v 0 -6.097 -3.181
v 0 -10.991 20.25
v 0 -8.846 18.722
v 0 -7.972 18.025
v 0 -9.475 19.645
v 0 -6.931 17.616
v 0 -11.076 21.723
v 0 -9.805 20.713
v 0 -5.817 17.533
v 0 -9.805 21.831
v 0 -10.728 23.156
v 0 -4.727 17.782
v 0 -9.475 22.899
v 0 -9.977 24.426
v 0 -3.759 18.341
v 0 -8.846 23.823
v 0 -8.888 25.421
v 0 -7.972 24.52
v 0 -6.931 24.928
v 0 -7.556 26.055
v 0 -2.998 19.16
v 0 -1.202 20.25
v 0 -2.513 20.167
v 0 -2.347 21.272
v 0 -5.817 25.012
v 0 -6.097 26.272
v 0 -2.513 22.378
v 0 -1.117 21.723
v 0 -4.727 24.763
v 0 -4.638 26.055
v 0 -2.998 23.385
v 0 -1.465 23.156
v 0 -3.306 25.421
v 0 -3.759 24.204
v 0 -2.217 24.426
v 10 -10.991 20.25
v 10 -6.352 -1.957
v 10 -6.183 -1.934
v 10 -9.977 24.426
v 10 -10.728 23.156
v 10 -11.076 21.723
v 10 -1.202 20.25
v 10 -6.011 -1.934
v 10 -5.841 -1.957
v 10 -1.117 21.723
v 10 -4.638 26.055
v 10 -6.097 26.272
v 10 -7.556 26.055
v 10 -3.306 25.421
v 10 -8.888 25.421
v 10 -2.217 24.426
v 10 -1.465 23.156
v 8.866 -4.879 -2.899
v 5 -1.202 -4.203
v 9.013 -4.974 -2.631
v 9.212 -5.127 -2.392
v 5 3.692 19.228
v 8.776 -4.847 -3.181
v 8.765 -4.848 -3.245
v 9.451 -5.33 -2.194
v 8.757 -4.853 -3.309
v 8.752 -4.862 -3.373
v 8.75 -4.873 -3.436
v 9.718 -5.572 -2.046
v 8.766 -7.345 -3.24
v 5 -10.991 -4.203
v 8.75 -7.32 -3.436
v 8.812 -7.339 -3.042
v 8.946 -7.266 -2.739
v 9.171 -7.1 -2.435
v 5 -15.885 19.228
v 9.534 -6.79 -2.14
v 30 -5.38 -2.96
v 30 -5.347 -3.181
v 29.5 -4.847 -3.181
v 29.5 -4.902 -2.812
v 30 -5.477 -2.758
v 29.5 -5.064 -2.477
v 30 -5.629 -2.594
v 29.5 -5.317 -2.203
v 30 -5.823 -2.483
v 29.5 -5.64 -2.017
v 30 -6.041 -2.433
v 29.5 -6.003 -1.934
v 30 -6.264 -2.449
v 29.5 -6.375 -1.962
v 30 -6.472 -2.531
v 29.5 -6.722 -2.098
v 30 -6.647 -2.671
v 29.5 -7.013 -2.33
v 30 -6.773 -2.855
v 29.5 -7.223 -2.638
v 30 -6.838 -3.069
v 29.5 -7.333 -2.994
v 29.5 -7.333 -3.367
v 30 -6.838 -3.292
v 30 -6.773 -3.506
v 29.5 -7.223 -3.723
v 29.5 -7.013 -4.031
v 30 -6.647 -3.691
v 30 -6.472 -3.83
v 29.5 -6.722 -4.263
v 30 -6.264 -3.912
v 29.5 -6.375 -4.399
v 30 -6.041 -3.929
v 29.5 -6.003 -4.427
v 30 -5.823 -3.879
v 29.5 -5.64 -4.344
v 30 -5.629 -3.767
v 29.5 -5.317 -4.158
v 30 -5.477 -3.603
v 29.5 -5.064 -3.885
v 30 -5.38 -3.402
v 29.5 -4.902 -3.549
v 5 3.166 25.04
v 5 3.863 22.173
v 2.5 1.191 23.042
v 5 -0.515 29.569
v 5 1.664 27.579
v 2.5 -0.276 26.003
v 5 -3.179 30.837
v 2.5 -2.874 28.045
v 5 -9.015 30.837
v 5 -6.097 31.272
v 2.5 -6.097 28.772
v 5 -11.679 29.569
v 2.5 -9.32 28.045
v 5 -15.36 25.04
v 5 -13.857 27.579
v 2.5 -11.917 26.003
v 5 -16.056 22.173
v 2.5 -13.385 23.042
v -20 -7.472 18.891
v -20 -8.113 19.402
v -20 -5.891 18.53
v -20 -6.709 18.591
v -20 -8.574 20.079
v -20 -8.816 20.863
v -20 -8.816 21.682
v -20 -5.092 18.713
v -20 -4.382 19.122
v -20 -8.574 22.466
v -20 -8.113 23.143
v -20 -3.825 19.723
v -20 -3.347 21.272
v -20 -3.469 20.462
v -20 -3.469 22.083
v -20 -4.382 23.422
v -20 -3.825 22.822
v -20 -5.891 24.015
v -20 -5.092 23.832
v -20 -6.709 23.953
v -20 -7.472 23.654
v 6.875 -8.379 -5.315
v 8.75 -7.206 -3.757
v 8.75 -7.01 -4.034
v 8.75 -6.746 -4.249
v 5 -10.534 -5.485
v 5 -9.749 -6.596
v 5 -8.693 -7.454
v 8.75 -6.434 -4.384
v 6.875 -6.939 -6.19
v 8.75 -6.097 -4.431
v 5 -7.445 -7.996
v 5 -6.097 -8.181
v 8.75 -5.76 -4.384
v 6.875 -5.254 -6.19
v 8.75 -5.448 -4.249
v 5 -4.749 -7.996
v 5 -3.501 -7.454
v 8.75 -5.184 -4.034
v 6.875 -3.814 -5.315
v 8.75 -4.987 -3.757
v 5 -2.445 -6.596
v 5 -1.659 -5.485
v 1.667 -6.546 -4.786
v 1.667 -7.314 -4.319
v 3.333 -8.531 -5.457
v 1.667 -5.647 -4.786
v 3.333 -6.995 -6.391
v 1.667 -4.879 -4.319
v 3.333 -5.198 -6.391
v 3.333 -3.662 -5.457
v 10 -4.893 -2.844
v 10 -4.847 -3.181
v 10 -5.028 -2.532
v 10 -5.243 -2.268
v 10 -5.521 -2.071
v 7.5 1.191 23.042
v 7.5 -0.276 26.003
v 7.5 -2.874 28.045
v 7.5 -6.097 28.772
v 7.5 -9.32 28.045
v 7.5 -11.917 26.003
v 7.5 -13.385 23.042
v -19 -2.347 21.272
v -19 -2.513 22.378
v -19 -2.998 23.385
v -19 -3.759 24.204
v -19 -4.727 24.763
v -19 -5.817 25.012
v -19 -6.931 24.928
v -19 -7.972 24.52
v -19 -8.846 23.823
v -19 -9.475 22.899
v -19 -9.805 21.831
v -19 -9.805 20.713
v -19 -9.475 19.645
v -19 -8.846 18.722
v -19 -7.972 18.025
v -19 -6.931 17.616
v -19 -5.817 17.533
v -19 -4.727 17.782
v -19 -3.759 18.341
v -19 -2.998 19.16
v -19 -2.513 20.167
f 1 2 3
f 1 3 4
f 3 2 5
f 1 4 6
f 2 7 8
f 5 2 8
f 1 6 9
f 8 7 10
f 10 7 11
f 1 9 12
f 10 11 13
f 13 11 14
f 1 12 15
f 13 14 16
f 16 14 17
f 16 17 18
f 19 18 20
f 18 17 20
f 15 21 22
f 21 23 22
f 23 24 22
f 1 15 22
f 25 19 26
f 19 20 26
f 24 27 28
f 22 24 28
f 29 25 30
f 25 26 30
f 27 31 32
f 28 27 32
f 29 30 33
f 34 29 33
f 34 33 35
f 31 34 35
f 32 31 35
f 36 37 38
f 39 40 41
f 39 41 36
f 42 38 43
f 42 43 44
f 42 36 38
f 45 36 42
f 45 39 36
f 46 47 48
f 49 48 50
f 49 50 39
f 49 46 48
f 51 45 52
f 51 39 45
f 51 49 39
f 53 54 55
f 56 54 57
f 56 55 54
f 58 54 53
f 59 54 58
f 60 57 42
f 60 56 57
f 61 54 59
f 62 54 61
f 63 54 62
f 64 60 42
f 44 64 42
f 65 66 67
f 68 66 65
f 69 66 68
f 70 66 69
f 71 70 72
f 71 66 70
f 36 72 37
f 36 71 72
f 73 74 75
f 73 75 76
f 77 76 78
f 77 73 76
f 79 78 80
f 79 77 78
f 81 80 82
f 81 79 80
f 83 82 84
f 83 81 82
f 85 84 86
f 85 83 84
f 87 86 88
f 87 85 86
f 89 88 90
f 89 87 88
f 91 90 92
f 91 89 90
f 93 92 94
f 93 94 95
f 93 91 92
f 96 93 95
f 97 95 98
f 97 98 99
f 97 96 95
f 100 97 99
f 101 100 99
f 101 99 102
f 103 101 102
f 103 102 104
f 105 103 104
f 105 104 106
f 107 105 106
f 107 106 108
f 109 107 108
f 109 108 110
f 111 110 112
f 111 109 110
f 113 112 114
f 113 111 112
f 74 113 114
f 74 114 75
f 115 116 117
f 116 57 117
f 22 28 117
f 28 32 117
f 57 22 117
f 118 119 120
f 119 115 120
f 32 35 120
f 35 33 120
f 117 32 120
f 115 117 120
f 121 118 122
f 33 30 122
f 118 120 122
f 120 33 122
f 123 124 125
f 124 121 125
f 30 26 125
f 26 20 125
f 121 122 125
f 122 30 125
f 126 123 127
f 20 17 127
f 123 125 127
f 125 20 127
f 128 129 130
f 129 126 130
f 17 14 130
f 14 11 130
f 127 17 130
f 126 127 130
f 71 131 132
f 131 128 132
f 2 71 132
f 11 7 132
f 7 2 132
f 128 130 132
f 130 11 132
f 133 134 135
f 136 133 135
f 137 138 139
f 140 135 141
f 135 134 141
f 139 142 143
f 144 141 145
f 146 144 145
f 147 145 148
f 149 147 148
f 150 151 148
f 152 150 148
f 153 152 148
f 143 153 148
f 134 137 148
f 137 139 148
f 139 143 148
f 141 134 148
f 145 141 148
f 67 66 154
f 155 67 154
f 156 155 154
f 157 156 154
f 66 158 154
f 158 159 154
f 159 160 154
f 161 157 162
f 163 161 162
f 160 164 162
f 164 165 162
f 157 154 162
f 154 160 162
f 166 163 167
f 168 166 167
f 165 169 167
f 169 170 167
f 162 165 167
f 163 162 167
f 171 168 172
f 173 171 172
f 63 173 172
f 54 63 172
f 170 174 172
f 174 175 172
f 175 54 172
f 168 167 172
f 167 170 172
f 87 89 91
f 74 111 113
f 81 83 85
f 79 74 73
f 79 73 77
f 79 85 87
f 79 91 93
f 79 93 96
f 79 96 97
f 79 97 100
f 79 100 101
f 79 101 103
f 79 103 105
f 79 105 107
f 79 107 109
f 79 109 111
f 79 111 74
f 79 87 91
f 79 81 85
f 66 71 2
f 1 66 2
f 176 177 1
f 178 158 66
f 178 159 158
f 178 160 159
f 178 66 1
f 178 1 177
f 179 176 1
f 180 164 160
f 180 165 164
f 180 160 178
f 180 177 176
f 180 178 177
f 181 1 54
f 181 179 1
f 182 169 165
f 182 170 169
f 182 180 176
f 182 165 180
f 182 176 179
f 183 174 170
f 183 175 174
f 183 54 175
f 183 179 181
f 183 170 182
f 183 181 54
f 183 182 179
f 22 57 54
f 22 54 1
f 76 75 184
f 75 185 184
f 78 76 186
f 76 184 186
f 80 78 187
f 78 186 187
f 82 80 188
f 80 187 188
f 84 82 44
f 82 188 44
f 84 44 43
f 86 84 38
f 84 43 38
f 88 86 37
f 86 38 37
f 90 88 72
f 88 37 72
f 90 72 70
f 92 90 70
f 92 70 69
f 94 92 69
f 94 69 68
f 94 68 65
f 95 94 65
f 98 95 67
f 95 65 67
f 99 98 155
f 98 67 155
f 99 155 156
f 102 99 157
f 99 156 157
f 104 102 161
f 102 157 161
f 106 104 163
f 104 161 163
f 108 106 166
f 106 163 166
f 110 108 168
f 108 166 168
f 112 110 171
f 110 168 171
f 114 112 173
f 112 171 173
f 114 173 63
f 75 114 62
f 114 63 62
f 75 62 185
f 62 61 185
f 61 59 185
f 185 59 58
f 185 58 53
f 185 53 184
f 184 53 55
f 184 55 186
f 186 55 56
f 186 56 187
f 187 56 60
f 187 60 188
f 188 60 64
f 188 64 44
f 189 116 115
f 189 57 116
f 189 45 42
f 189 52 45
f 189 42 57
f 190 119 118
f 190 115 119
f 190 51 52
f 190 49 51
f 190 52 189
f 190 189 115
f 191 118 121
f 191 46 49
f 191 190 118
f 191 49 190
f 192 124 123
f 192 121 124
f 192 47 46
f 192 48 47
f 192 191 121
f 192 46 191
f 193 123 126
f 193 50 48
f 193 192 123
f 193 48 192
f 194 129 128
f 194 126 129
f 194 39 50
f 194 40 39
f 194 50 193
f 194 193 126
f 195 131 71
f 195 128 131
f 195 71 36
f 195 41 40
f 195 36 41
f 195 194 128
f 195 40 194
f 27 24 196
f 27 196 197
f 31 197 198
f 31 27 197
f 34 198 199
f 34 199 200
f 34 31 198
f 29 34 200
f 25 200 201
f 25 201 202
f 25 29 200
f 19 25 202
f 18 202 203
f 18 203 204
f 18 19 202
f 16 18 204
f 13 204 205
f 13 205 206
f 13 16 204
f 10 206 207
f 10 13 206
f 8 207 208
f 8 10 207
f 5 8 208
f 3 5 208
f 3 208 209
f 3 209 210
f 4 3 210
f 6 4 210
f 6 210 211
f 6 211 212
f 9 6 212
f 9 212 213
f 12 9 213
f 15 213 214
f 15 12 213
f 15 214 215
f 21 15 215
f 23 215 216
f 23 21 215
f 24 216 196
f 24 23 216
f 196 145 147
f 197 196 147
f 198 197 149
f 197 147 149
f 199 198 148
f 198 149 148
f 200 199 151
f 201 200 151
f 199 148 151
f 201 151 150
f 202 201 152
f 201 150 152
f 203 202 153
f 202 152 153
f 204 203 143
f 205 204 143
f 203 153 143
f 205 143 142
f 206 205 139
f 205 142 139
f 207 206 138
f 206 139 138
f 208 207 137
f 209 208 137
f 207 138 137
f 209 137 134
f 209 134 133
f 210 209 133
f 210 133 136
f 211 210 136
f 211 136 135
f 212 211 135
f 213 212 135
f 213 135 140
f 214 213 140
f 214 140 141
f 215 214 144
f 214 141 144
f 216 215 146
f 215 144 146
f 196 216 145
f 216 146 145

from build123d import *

# Parameters (mm, degrees)
F0_R         = 3.75
F0_R_2       = 1.25
F1_DEPTH     = 10
F2_DEPTH     = 20
F3_DEPTH     = 30
F4_T1_DEPTH  = 23.936451485
F4_T3_DEPTH  = 23.936451485
F4_T8_DEPTH  = 23.936451485
F4_S9_R      = 1.25
F4_T10_DEPTH = 15
F4_T14_ANGLE = 156.4026846179
F4_S15_R     = 1.25
F4_T16_DEPTH = 8
F4_T18_ANGLE = 203.5973153821
F4_T22_DEPTH = 23.936451485
F4_S23_R     = 1.25
F4_T24_DEPTH = 15
F4_T26_ANGLE = 156.4026846179
F4_T28_ANGLE = 203.5973153821
F5_SIZE      = 1
F6_SIZE      = 0.5


# Not quite as in the source:
# - a fillet or chamfer that OpenCascade refuses, or shapes differently, is made with other operations: its cross-section is extruded or revolved along the edge and cut away or added


with BuildPart() as f1:
    # F0 (on Right) → F1 (new body)
    with BuildSketch(Plane.YZ):
        with BuildLine():
            ThreePointArc((3.6919470815, 19.2276737533), (3.8502654993, 20.2445960951), (3.9032252878, 21.2724049449))
            ThreePointArc((3.9032252878, 21.2724049449), (-7.124583562, 31.2194451563), (-15.8854965059, 19.2276737533))
            ThreePointArc((-15.8854965059, 19.2276737533), (-6.0967747122, 11.2724049449), (3.6919470815, 19.2276737533))
        make_face()
        with Locations((-6.0967747122, 21.2724049449)):
            Circle(F0_R, mode=Mode.SUBTRACT)
        with BuildLine():
            ThreePointArc((3.6919470815, 19.2276737533), (-6.0967747122, 11.2724049449), (-15.8854965059, 19.2276737533))
            Line((-15.8854965059, 19.2276737533), (-10.991135609, -4.2030526781))
            ThreePointArc((-10.991135609, -4.2030526781), (-6.6106791371, 1.7928330234), (-1.0967747122, -3.1806870823))
            ThreePointArc((-1.0967747122, -3.1806870823), (-1.1232546065, -3.6945915072), (-1.2024138154, -4.2030526781))
            Line((-1.2024138154, -4.2030526781), (3.6919470815, 19.2276737533))
        make_face()
        with BuildLine():
            ThreePointArc((-1.0967747122, -3.1806870823), (-6.6106791371, 1.7928330234), (-10.991135609, -4.2030526781))
            ThreePointArc((-10.991135609, -4.2030526781), (-6.0967747122, -8.1806870823), (-1.2024138154, -4.2030526781))
            ThreePointArc((-1.2024138154, -4.2030526781), (-1.1232546065, -3.6945915072), (-1.0967747122, -3.1806870823))
        make_face()
        with Locations((-6.0967747122, -3.1806870823)):
            Circle(F0_R_2, mode=Mode.SUBTRACT)
        with Locations((-6.0967747122, 21.2724049449)):
            Circle(F0_R)
        with Locations((-6.0967747122, -3.1806870823)):
            Circle(F0_R_2)
    extrude(amount=F1_DEPTH)

    # F0 (on Right) → F2 (join)
    with BuildSketch(Plane.YZ):
        with Locations((-6.0967747122, 21.2724049449)):
            Circle(F0_R)
    extrude(amount=-F2_DEPTH)

    # F0 (on Right) → F3 (join)
    with BuildSketch(Plane.YZ):
        with Locations((-6.0967747122, -3.1806870823)):
            Circle(F0_R_2)
    extrude(amount=F3_DEPTH)

    # F4: chamfer of 5 on 2 edges, made by hand

    # F4_s2 → F4_t1 (cut)
    with BuildSketch(Plane(origin=(0, -0.8915258311, -4.2679929606), x_dir=(1, 0, 0), z_dir=(0, 0.2044731192, 0.9788721794))):
        Polygon((5, -0.3175981408), (0, -5.3175981408), (0, -0.3175981408), align=None)
    extrude(amount=F4_T1_DEPTH, mode=Mode.SUBTRACT)

    # F4_s4 → F4_t3 (cut)
    with BuildSketch(Plane(origin=(0, -4.5126383008, 21.6033095513), x_dir=(1, 0, 0), z_dir=(0, 0.2044731192, -0.9788721794))):
        Polygon((5, 11.6183281585), (0, 6.6183281585), (0, 11.6183281585), align=None)
    extrude(amount=F4_T3_DEPTH, mode=Mode.SUBTRACT)


with BuildPart() as f4_tool6:
    # F4_s7 → F4_t8 (new body)
    with BuildSketch(Plane(origin=(0, -0.8915258311, -4.2679929606), x_dir=(1, 0, 0), z_dir=(0, 0.2044731192, 0.9788721794))):
        Polygon((5, -0.3175981408), (10, -5.3175981408), (10, -0.3175981408), align=None)
    extrude(amount=F4_T8_DEPTH)

    # F4_s9 → F4_t10 (cut, symmetric)
    with BuildSketch(Plane.YZ.offset(7.5)):
        with Locations((-6.0967747122, -3.1806870823)):
            Circle(F4_S9_R)
    extrude(amount=F4_T10_DEPTH, both=True, mode=Mode.SUBTRACT)


with BuildPart() as f1_1:
    add(f1.part)

    # F4_t5: cut F4_tool6
    add(f4_tool6.part, mode=Mode.SUBTRACT)


with BuildPart() as f4_tool12:
    # F4_s13 → F4_t14 (revolve)
    with BuildSketch(Plane(origin=(0, 0.381722596, -1.8274168801), x_dir=(1, 0, 0), z_dir=(0, -0.2044731192, 0.9788721794))):
        Polygon((10, -6.6183281585), (5, -11.6183281585), (10, -11.6183281585), align=None)
    revolve(axis=Axis((10, -6.0967747122, -3.1806870823), (1, 0, 0)), revolution_arc=F4_T14_ANGLE)

    # F4_s15 → F4_t16 (cut, symmetric)
    with BuildSketch(Plane.YZ.offset(7.5)):
        with Locations((-6.0967747122, -3.1806870823)):
            Circle(F4_S15_R)
    extrude(amount=F4_T16_DEPTH, both=True, mode=Mode.SUBTRACT)


with BuildPart() as f1_2:
    add(f1_1.part)

    # F4_t11: cut F4_tool12
    add(f4_tool12.part, mode=Mode.SUBTRACT)

    # F4_s17 → F4_t18 (revolve, cut)
    with BuildSketch(Plane(origin=(0, 4.0028350658, 19.1627334708), x_dir=(1, 0, 0), z_dir=(0, -0.2044731192, -0.9788721794))):
        Polygon((5, 0.3175981408), (10, 5.3175981408), (10, 0.3175981408), align=None)
    revolve(axis=Axis((10, -6.0967747122, 21.2724049449), (1, 0, 0)), revolution_arc=F4_T18_ANGLE, mode=Mode.SUBTRACT)


with BuildPart() as f4_tool20:
    # F4_s21 → F4_t22 (new body)
    with BuildSketch(Plane(origin=(0, -4.5126383008, 21.6033095513), x_dir=(1, 0, 0), z_dir=(0, 0.2044731192, -0.9788721794))):
        Polygon((5, 11.6183281585), (10, 6.6183281585), (10, 11.6183281585), align=None)
    extrude(amount=F4_T22_DEPTH)

    # F4_s23 → F4_t24 (cut, symmetric)
    with BuildSketch(Plane.YZ.offset(7.5)):
        with Locations((-6.0967747122, -3.1806870823)):
            Circle(F4_S23_R)
    extrude(amount=F4_T24_DEPTH, both=True, mode=Mode.SUBTRACT)


with BuildPart() as f1_3:
    add(f1_2.part)

    # F4_t19: cut F4_tool20
    add(f4_tool20.part, mode=Mode.SUBTRACT)

    # F4_s25 → F4_t26 (revolve, cut)
    with BuildSketch(Plane(origin=(0, 0.381722596, -1.8274168801), x_dir=(1, 0, 0), z_dir=(0, -0.2044731192, 0.9788721794))):
        Polygon((0, -6.6183281585), (5, -11.6183281585), (0, -11.6183281585), align=None)
    revolve(axis=Axis((0, -6.0967747122, -3.1806870823), (1, 0, 0)), revolution_arc=F4_T26_ANGLE, mode=Mode.SUBTRACT)

    # F4_s27 → F4_t28 (revolve, cut)
    with BuildSketch(Plane(origin=(0, 4.0028350658, 19.1627334708), x_dir=(1, 0, 0), z_dir=(0, -0.2044731192, -0.9788721794))):
        Polygon((5, 0.3175981408), (0, 5.3175981408), (0, 0.3175981408), align=None)
    revolve(axis=Axis((0, -6.0967747122, 21.2724049449), (1, 0, 0)), revolution_arc=F4_T28_ANGLE, mode=Mode.SUBTRACT)

    # F5
    f5_edges = [f1_3.edges().sort_by_distance(p)[0] for p in [
        (-20, -9.846775, 21.272405),
    ]]
    chamfer(f5_edges, length=F5_SIZE)

    # F6
    f6_edges = [f1_3.edges().sort_by_distance(p)[0] for p in [
        (30, -7.346775, -3.180687),
    ]]
    chamfer(f6_edges, length=F6_SIZE)


solid = f1_3.part
